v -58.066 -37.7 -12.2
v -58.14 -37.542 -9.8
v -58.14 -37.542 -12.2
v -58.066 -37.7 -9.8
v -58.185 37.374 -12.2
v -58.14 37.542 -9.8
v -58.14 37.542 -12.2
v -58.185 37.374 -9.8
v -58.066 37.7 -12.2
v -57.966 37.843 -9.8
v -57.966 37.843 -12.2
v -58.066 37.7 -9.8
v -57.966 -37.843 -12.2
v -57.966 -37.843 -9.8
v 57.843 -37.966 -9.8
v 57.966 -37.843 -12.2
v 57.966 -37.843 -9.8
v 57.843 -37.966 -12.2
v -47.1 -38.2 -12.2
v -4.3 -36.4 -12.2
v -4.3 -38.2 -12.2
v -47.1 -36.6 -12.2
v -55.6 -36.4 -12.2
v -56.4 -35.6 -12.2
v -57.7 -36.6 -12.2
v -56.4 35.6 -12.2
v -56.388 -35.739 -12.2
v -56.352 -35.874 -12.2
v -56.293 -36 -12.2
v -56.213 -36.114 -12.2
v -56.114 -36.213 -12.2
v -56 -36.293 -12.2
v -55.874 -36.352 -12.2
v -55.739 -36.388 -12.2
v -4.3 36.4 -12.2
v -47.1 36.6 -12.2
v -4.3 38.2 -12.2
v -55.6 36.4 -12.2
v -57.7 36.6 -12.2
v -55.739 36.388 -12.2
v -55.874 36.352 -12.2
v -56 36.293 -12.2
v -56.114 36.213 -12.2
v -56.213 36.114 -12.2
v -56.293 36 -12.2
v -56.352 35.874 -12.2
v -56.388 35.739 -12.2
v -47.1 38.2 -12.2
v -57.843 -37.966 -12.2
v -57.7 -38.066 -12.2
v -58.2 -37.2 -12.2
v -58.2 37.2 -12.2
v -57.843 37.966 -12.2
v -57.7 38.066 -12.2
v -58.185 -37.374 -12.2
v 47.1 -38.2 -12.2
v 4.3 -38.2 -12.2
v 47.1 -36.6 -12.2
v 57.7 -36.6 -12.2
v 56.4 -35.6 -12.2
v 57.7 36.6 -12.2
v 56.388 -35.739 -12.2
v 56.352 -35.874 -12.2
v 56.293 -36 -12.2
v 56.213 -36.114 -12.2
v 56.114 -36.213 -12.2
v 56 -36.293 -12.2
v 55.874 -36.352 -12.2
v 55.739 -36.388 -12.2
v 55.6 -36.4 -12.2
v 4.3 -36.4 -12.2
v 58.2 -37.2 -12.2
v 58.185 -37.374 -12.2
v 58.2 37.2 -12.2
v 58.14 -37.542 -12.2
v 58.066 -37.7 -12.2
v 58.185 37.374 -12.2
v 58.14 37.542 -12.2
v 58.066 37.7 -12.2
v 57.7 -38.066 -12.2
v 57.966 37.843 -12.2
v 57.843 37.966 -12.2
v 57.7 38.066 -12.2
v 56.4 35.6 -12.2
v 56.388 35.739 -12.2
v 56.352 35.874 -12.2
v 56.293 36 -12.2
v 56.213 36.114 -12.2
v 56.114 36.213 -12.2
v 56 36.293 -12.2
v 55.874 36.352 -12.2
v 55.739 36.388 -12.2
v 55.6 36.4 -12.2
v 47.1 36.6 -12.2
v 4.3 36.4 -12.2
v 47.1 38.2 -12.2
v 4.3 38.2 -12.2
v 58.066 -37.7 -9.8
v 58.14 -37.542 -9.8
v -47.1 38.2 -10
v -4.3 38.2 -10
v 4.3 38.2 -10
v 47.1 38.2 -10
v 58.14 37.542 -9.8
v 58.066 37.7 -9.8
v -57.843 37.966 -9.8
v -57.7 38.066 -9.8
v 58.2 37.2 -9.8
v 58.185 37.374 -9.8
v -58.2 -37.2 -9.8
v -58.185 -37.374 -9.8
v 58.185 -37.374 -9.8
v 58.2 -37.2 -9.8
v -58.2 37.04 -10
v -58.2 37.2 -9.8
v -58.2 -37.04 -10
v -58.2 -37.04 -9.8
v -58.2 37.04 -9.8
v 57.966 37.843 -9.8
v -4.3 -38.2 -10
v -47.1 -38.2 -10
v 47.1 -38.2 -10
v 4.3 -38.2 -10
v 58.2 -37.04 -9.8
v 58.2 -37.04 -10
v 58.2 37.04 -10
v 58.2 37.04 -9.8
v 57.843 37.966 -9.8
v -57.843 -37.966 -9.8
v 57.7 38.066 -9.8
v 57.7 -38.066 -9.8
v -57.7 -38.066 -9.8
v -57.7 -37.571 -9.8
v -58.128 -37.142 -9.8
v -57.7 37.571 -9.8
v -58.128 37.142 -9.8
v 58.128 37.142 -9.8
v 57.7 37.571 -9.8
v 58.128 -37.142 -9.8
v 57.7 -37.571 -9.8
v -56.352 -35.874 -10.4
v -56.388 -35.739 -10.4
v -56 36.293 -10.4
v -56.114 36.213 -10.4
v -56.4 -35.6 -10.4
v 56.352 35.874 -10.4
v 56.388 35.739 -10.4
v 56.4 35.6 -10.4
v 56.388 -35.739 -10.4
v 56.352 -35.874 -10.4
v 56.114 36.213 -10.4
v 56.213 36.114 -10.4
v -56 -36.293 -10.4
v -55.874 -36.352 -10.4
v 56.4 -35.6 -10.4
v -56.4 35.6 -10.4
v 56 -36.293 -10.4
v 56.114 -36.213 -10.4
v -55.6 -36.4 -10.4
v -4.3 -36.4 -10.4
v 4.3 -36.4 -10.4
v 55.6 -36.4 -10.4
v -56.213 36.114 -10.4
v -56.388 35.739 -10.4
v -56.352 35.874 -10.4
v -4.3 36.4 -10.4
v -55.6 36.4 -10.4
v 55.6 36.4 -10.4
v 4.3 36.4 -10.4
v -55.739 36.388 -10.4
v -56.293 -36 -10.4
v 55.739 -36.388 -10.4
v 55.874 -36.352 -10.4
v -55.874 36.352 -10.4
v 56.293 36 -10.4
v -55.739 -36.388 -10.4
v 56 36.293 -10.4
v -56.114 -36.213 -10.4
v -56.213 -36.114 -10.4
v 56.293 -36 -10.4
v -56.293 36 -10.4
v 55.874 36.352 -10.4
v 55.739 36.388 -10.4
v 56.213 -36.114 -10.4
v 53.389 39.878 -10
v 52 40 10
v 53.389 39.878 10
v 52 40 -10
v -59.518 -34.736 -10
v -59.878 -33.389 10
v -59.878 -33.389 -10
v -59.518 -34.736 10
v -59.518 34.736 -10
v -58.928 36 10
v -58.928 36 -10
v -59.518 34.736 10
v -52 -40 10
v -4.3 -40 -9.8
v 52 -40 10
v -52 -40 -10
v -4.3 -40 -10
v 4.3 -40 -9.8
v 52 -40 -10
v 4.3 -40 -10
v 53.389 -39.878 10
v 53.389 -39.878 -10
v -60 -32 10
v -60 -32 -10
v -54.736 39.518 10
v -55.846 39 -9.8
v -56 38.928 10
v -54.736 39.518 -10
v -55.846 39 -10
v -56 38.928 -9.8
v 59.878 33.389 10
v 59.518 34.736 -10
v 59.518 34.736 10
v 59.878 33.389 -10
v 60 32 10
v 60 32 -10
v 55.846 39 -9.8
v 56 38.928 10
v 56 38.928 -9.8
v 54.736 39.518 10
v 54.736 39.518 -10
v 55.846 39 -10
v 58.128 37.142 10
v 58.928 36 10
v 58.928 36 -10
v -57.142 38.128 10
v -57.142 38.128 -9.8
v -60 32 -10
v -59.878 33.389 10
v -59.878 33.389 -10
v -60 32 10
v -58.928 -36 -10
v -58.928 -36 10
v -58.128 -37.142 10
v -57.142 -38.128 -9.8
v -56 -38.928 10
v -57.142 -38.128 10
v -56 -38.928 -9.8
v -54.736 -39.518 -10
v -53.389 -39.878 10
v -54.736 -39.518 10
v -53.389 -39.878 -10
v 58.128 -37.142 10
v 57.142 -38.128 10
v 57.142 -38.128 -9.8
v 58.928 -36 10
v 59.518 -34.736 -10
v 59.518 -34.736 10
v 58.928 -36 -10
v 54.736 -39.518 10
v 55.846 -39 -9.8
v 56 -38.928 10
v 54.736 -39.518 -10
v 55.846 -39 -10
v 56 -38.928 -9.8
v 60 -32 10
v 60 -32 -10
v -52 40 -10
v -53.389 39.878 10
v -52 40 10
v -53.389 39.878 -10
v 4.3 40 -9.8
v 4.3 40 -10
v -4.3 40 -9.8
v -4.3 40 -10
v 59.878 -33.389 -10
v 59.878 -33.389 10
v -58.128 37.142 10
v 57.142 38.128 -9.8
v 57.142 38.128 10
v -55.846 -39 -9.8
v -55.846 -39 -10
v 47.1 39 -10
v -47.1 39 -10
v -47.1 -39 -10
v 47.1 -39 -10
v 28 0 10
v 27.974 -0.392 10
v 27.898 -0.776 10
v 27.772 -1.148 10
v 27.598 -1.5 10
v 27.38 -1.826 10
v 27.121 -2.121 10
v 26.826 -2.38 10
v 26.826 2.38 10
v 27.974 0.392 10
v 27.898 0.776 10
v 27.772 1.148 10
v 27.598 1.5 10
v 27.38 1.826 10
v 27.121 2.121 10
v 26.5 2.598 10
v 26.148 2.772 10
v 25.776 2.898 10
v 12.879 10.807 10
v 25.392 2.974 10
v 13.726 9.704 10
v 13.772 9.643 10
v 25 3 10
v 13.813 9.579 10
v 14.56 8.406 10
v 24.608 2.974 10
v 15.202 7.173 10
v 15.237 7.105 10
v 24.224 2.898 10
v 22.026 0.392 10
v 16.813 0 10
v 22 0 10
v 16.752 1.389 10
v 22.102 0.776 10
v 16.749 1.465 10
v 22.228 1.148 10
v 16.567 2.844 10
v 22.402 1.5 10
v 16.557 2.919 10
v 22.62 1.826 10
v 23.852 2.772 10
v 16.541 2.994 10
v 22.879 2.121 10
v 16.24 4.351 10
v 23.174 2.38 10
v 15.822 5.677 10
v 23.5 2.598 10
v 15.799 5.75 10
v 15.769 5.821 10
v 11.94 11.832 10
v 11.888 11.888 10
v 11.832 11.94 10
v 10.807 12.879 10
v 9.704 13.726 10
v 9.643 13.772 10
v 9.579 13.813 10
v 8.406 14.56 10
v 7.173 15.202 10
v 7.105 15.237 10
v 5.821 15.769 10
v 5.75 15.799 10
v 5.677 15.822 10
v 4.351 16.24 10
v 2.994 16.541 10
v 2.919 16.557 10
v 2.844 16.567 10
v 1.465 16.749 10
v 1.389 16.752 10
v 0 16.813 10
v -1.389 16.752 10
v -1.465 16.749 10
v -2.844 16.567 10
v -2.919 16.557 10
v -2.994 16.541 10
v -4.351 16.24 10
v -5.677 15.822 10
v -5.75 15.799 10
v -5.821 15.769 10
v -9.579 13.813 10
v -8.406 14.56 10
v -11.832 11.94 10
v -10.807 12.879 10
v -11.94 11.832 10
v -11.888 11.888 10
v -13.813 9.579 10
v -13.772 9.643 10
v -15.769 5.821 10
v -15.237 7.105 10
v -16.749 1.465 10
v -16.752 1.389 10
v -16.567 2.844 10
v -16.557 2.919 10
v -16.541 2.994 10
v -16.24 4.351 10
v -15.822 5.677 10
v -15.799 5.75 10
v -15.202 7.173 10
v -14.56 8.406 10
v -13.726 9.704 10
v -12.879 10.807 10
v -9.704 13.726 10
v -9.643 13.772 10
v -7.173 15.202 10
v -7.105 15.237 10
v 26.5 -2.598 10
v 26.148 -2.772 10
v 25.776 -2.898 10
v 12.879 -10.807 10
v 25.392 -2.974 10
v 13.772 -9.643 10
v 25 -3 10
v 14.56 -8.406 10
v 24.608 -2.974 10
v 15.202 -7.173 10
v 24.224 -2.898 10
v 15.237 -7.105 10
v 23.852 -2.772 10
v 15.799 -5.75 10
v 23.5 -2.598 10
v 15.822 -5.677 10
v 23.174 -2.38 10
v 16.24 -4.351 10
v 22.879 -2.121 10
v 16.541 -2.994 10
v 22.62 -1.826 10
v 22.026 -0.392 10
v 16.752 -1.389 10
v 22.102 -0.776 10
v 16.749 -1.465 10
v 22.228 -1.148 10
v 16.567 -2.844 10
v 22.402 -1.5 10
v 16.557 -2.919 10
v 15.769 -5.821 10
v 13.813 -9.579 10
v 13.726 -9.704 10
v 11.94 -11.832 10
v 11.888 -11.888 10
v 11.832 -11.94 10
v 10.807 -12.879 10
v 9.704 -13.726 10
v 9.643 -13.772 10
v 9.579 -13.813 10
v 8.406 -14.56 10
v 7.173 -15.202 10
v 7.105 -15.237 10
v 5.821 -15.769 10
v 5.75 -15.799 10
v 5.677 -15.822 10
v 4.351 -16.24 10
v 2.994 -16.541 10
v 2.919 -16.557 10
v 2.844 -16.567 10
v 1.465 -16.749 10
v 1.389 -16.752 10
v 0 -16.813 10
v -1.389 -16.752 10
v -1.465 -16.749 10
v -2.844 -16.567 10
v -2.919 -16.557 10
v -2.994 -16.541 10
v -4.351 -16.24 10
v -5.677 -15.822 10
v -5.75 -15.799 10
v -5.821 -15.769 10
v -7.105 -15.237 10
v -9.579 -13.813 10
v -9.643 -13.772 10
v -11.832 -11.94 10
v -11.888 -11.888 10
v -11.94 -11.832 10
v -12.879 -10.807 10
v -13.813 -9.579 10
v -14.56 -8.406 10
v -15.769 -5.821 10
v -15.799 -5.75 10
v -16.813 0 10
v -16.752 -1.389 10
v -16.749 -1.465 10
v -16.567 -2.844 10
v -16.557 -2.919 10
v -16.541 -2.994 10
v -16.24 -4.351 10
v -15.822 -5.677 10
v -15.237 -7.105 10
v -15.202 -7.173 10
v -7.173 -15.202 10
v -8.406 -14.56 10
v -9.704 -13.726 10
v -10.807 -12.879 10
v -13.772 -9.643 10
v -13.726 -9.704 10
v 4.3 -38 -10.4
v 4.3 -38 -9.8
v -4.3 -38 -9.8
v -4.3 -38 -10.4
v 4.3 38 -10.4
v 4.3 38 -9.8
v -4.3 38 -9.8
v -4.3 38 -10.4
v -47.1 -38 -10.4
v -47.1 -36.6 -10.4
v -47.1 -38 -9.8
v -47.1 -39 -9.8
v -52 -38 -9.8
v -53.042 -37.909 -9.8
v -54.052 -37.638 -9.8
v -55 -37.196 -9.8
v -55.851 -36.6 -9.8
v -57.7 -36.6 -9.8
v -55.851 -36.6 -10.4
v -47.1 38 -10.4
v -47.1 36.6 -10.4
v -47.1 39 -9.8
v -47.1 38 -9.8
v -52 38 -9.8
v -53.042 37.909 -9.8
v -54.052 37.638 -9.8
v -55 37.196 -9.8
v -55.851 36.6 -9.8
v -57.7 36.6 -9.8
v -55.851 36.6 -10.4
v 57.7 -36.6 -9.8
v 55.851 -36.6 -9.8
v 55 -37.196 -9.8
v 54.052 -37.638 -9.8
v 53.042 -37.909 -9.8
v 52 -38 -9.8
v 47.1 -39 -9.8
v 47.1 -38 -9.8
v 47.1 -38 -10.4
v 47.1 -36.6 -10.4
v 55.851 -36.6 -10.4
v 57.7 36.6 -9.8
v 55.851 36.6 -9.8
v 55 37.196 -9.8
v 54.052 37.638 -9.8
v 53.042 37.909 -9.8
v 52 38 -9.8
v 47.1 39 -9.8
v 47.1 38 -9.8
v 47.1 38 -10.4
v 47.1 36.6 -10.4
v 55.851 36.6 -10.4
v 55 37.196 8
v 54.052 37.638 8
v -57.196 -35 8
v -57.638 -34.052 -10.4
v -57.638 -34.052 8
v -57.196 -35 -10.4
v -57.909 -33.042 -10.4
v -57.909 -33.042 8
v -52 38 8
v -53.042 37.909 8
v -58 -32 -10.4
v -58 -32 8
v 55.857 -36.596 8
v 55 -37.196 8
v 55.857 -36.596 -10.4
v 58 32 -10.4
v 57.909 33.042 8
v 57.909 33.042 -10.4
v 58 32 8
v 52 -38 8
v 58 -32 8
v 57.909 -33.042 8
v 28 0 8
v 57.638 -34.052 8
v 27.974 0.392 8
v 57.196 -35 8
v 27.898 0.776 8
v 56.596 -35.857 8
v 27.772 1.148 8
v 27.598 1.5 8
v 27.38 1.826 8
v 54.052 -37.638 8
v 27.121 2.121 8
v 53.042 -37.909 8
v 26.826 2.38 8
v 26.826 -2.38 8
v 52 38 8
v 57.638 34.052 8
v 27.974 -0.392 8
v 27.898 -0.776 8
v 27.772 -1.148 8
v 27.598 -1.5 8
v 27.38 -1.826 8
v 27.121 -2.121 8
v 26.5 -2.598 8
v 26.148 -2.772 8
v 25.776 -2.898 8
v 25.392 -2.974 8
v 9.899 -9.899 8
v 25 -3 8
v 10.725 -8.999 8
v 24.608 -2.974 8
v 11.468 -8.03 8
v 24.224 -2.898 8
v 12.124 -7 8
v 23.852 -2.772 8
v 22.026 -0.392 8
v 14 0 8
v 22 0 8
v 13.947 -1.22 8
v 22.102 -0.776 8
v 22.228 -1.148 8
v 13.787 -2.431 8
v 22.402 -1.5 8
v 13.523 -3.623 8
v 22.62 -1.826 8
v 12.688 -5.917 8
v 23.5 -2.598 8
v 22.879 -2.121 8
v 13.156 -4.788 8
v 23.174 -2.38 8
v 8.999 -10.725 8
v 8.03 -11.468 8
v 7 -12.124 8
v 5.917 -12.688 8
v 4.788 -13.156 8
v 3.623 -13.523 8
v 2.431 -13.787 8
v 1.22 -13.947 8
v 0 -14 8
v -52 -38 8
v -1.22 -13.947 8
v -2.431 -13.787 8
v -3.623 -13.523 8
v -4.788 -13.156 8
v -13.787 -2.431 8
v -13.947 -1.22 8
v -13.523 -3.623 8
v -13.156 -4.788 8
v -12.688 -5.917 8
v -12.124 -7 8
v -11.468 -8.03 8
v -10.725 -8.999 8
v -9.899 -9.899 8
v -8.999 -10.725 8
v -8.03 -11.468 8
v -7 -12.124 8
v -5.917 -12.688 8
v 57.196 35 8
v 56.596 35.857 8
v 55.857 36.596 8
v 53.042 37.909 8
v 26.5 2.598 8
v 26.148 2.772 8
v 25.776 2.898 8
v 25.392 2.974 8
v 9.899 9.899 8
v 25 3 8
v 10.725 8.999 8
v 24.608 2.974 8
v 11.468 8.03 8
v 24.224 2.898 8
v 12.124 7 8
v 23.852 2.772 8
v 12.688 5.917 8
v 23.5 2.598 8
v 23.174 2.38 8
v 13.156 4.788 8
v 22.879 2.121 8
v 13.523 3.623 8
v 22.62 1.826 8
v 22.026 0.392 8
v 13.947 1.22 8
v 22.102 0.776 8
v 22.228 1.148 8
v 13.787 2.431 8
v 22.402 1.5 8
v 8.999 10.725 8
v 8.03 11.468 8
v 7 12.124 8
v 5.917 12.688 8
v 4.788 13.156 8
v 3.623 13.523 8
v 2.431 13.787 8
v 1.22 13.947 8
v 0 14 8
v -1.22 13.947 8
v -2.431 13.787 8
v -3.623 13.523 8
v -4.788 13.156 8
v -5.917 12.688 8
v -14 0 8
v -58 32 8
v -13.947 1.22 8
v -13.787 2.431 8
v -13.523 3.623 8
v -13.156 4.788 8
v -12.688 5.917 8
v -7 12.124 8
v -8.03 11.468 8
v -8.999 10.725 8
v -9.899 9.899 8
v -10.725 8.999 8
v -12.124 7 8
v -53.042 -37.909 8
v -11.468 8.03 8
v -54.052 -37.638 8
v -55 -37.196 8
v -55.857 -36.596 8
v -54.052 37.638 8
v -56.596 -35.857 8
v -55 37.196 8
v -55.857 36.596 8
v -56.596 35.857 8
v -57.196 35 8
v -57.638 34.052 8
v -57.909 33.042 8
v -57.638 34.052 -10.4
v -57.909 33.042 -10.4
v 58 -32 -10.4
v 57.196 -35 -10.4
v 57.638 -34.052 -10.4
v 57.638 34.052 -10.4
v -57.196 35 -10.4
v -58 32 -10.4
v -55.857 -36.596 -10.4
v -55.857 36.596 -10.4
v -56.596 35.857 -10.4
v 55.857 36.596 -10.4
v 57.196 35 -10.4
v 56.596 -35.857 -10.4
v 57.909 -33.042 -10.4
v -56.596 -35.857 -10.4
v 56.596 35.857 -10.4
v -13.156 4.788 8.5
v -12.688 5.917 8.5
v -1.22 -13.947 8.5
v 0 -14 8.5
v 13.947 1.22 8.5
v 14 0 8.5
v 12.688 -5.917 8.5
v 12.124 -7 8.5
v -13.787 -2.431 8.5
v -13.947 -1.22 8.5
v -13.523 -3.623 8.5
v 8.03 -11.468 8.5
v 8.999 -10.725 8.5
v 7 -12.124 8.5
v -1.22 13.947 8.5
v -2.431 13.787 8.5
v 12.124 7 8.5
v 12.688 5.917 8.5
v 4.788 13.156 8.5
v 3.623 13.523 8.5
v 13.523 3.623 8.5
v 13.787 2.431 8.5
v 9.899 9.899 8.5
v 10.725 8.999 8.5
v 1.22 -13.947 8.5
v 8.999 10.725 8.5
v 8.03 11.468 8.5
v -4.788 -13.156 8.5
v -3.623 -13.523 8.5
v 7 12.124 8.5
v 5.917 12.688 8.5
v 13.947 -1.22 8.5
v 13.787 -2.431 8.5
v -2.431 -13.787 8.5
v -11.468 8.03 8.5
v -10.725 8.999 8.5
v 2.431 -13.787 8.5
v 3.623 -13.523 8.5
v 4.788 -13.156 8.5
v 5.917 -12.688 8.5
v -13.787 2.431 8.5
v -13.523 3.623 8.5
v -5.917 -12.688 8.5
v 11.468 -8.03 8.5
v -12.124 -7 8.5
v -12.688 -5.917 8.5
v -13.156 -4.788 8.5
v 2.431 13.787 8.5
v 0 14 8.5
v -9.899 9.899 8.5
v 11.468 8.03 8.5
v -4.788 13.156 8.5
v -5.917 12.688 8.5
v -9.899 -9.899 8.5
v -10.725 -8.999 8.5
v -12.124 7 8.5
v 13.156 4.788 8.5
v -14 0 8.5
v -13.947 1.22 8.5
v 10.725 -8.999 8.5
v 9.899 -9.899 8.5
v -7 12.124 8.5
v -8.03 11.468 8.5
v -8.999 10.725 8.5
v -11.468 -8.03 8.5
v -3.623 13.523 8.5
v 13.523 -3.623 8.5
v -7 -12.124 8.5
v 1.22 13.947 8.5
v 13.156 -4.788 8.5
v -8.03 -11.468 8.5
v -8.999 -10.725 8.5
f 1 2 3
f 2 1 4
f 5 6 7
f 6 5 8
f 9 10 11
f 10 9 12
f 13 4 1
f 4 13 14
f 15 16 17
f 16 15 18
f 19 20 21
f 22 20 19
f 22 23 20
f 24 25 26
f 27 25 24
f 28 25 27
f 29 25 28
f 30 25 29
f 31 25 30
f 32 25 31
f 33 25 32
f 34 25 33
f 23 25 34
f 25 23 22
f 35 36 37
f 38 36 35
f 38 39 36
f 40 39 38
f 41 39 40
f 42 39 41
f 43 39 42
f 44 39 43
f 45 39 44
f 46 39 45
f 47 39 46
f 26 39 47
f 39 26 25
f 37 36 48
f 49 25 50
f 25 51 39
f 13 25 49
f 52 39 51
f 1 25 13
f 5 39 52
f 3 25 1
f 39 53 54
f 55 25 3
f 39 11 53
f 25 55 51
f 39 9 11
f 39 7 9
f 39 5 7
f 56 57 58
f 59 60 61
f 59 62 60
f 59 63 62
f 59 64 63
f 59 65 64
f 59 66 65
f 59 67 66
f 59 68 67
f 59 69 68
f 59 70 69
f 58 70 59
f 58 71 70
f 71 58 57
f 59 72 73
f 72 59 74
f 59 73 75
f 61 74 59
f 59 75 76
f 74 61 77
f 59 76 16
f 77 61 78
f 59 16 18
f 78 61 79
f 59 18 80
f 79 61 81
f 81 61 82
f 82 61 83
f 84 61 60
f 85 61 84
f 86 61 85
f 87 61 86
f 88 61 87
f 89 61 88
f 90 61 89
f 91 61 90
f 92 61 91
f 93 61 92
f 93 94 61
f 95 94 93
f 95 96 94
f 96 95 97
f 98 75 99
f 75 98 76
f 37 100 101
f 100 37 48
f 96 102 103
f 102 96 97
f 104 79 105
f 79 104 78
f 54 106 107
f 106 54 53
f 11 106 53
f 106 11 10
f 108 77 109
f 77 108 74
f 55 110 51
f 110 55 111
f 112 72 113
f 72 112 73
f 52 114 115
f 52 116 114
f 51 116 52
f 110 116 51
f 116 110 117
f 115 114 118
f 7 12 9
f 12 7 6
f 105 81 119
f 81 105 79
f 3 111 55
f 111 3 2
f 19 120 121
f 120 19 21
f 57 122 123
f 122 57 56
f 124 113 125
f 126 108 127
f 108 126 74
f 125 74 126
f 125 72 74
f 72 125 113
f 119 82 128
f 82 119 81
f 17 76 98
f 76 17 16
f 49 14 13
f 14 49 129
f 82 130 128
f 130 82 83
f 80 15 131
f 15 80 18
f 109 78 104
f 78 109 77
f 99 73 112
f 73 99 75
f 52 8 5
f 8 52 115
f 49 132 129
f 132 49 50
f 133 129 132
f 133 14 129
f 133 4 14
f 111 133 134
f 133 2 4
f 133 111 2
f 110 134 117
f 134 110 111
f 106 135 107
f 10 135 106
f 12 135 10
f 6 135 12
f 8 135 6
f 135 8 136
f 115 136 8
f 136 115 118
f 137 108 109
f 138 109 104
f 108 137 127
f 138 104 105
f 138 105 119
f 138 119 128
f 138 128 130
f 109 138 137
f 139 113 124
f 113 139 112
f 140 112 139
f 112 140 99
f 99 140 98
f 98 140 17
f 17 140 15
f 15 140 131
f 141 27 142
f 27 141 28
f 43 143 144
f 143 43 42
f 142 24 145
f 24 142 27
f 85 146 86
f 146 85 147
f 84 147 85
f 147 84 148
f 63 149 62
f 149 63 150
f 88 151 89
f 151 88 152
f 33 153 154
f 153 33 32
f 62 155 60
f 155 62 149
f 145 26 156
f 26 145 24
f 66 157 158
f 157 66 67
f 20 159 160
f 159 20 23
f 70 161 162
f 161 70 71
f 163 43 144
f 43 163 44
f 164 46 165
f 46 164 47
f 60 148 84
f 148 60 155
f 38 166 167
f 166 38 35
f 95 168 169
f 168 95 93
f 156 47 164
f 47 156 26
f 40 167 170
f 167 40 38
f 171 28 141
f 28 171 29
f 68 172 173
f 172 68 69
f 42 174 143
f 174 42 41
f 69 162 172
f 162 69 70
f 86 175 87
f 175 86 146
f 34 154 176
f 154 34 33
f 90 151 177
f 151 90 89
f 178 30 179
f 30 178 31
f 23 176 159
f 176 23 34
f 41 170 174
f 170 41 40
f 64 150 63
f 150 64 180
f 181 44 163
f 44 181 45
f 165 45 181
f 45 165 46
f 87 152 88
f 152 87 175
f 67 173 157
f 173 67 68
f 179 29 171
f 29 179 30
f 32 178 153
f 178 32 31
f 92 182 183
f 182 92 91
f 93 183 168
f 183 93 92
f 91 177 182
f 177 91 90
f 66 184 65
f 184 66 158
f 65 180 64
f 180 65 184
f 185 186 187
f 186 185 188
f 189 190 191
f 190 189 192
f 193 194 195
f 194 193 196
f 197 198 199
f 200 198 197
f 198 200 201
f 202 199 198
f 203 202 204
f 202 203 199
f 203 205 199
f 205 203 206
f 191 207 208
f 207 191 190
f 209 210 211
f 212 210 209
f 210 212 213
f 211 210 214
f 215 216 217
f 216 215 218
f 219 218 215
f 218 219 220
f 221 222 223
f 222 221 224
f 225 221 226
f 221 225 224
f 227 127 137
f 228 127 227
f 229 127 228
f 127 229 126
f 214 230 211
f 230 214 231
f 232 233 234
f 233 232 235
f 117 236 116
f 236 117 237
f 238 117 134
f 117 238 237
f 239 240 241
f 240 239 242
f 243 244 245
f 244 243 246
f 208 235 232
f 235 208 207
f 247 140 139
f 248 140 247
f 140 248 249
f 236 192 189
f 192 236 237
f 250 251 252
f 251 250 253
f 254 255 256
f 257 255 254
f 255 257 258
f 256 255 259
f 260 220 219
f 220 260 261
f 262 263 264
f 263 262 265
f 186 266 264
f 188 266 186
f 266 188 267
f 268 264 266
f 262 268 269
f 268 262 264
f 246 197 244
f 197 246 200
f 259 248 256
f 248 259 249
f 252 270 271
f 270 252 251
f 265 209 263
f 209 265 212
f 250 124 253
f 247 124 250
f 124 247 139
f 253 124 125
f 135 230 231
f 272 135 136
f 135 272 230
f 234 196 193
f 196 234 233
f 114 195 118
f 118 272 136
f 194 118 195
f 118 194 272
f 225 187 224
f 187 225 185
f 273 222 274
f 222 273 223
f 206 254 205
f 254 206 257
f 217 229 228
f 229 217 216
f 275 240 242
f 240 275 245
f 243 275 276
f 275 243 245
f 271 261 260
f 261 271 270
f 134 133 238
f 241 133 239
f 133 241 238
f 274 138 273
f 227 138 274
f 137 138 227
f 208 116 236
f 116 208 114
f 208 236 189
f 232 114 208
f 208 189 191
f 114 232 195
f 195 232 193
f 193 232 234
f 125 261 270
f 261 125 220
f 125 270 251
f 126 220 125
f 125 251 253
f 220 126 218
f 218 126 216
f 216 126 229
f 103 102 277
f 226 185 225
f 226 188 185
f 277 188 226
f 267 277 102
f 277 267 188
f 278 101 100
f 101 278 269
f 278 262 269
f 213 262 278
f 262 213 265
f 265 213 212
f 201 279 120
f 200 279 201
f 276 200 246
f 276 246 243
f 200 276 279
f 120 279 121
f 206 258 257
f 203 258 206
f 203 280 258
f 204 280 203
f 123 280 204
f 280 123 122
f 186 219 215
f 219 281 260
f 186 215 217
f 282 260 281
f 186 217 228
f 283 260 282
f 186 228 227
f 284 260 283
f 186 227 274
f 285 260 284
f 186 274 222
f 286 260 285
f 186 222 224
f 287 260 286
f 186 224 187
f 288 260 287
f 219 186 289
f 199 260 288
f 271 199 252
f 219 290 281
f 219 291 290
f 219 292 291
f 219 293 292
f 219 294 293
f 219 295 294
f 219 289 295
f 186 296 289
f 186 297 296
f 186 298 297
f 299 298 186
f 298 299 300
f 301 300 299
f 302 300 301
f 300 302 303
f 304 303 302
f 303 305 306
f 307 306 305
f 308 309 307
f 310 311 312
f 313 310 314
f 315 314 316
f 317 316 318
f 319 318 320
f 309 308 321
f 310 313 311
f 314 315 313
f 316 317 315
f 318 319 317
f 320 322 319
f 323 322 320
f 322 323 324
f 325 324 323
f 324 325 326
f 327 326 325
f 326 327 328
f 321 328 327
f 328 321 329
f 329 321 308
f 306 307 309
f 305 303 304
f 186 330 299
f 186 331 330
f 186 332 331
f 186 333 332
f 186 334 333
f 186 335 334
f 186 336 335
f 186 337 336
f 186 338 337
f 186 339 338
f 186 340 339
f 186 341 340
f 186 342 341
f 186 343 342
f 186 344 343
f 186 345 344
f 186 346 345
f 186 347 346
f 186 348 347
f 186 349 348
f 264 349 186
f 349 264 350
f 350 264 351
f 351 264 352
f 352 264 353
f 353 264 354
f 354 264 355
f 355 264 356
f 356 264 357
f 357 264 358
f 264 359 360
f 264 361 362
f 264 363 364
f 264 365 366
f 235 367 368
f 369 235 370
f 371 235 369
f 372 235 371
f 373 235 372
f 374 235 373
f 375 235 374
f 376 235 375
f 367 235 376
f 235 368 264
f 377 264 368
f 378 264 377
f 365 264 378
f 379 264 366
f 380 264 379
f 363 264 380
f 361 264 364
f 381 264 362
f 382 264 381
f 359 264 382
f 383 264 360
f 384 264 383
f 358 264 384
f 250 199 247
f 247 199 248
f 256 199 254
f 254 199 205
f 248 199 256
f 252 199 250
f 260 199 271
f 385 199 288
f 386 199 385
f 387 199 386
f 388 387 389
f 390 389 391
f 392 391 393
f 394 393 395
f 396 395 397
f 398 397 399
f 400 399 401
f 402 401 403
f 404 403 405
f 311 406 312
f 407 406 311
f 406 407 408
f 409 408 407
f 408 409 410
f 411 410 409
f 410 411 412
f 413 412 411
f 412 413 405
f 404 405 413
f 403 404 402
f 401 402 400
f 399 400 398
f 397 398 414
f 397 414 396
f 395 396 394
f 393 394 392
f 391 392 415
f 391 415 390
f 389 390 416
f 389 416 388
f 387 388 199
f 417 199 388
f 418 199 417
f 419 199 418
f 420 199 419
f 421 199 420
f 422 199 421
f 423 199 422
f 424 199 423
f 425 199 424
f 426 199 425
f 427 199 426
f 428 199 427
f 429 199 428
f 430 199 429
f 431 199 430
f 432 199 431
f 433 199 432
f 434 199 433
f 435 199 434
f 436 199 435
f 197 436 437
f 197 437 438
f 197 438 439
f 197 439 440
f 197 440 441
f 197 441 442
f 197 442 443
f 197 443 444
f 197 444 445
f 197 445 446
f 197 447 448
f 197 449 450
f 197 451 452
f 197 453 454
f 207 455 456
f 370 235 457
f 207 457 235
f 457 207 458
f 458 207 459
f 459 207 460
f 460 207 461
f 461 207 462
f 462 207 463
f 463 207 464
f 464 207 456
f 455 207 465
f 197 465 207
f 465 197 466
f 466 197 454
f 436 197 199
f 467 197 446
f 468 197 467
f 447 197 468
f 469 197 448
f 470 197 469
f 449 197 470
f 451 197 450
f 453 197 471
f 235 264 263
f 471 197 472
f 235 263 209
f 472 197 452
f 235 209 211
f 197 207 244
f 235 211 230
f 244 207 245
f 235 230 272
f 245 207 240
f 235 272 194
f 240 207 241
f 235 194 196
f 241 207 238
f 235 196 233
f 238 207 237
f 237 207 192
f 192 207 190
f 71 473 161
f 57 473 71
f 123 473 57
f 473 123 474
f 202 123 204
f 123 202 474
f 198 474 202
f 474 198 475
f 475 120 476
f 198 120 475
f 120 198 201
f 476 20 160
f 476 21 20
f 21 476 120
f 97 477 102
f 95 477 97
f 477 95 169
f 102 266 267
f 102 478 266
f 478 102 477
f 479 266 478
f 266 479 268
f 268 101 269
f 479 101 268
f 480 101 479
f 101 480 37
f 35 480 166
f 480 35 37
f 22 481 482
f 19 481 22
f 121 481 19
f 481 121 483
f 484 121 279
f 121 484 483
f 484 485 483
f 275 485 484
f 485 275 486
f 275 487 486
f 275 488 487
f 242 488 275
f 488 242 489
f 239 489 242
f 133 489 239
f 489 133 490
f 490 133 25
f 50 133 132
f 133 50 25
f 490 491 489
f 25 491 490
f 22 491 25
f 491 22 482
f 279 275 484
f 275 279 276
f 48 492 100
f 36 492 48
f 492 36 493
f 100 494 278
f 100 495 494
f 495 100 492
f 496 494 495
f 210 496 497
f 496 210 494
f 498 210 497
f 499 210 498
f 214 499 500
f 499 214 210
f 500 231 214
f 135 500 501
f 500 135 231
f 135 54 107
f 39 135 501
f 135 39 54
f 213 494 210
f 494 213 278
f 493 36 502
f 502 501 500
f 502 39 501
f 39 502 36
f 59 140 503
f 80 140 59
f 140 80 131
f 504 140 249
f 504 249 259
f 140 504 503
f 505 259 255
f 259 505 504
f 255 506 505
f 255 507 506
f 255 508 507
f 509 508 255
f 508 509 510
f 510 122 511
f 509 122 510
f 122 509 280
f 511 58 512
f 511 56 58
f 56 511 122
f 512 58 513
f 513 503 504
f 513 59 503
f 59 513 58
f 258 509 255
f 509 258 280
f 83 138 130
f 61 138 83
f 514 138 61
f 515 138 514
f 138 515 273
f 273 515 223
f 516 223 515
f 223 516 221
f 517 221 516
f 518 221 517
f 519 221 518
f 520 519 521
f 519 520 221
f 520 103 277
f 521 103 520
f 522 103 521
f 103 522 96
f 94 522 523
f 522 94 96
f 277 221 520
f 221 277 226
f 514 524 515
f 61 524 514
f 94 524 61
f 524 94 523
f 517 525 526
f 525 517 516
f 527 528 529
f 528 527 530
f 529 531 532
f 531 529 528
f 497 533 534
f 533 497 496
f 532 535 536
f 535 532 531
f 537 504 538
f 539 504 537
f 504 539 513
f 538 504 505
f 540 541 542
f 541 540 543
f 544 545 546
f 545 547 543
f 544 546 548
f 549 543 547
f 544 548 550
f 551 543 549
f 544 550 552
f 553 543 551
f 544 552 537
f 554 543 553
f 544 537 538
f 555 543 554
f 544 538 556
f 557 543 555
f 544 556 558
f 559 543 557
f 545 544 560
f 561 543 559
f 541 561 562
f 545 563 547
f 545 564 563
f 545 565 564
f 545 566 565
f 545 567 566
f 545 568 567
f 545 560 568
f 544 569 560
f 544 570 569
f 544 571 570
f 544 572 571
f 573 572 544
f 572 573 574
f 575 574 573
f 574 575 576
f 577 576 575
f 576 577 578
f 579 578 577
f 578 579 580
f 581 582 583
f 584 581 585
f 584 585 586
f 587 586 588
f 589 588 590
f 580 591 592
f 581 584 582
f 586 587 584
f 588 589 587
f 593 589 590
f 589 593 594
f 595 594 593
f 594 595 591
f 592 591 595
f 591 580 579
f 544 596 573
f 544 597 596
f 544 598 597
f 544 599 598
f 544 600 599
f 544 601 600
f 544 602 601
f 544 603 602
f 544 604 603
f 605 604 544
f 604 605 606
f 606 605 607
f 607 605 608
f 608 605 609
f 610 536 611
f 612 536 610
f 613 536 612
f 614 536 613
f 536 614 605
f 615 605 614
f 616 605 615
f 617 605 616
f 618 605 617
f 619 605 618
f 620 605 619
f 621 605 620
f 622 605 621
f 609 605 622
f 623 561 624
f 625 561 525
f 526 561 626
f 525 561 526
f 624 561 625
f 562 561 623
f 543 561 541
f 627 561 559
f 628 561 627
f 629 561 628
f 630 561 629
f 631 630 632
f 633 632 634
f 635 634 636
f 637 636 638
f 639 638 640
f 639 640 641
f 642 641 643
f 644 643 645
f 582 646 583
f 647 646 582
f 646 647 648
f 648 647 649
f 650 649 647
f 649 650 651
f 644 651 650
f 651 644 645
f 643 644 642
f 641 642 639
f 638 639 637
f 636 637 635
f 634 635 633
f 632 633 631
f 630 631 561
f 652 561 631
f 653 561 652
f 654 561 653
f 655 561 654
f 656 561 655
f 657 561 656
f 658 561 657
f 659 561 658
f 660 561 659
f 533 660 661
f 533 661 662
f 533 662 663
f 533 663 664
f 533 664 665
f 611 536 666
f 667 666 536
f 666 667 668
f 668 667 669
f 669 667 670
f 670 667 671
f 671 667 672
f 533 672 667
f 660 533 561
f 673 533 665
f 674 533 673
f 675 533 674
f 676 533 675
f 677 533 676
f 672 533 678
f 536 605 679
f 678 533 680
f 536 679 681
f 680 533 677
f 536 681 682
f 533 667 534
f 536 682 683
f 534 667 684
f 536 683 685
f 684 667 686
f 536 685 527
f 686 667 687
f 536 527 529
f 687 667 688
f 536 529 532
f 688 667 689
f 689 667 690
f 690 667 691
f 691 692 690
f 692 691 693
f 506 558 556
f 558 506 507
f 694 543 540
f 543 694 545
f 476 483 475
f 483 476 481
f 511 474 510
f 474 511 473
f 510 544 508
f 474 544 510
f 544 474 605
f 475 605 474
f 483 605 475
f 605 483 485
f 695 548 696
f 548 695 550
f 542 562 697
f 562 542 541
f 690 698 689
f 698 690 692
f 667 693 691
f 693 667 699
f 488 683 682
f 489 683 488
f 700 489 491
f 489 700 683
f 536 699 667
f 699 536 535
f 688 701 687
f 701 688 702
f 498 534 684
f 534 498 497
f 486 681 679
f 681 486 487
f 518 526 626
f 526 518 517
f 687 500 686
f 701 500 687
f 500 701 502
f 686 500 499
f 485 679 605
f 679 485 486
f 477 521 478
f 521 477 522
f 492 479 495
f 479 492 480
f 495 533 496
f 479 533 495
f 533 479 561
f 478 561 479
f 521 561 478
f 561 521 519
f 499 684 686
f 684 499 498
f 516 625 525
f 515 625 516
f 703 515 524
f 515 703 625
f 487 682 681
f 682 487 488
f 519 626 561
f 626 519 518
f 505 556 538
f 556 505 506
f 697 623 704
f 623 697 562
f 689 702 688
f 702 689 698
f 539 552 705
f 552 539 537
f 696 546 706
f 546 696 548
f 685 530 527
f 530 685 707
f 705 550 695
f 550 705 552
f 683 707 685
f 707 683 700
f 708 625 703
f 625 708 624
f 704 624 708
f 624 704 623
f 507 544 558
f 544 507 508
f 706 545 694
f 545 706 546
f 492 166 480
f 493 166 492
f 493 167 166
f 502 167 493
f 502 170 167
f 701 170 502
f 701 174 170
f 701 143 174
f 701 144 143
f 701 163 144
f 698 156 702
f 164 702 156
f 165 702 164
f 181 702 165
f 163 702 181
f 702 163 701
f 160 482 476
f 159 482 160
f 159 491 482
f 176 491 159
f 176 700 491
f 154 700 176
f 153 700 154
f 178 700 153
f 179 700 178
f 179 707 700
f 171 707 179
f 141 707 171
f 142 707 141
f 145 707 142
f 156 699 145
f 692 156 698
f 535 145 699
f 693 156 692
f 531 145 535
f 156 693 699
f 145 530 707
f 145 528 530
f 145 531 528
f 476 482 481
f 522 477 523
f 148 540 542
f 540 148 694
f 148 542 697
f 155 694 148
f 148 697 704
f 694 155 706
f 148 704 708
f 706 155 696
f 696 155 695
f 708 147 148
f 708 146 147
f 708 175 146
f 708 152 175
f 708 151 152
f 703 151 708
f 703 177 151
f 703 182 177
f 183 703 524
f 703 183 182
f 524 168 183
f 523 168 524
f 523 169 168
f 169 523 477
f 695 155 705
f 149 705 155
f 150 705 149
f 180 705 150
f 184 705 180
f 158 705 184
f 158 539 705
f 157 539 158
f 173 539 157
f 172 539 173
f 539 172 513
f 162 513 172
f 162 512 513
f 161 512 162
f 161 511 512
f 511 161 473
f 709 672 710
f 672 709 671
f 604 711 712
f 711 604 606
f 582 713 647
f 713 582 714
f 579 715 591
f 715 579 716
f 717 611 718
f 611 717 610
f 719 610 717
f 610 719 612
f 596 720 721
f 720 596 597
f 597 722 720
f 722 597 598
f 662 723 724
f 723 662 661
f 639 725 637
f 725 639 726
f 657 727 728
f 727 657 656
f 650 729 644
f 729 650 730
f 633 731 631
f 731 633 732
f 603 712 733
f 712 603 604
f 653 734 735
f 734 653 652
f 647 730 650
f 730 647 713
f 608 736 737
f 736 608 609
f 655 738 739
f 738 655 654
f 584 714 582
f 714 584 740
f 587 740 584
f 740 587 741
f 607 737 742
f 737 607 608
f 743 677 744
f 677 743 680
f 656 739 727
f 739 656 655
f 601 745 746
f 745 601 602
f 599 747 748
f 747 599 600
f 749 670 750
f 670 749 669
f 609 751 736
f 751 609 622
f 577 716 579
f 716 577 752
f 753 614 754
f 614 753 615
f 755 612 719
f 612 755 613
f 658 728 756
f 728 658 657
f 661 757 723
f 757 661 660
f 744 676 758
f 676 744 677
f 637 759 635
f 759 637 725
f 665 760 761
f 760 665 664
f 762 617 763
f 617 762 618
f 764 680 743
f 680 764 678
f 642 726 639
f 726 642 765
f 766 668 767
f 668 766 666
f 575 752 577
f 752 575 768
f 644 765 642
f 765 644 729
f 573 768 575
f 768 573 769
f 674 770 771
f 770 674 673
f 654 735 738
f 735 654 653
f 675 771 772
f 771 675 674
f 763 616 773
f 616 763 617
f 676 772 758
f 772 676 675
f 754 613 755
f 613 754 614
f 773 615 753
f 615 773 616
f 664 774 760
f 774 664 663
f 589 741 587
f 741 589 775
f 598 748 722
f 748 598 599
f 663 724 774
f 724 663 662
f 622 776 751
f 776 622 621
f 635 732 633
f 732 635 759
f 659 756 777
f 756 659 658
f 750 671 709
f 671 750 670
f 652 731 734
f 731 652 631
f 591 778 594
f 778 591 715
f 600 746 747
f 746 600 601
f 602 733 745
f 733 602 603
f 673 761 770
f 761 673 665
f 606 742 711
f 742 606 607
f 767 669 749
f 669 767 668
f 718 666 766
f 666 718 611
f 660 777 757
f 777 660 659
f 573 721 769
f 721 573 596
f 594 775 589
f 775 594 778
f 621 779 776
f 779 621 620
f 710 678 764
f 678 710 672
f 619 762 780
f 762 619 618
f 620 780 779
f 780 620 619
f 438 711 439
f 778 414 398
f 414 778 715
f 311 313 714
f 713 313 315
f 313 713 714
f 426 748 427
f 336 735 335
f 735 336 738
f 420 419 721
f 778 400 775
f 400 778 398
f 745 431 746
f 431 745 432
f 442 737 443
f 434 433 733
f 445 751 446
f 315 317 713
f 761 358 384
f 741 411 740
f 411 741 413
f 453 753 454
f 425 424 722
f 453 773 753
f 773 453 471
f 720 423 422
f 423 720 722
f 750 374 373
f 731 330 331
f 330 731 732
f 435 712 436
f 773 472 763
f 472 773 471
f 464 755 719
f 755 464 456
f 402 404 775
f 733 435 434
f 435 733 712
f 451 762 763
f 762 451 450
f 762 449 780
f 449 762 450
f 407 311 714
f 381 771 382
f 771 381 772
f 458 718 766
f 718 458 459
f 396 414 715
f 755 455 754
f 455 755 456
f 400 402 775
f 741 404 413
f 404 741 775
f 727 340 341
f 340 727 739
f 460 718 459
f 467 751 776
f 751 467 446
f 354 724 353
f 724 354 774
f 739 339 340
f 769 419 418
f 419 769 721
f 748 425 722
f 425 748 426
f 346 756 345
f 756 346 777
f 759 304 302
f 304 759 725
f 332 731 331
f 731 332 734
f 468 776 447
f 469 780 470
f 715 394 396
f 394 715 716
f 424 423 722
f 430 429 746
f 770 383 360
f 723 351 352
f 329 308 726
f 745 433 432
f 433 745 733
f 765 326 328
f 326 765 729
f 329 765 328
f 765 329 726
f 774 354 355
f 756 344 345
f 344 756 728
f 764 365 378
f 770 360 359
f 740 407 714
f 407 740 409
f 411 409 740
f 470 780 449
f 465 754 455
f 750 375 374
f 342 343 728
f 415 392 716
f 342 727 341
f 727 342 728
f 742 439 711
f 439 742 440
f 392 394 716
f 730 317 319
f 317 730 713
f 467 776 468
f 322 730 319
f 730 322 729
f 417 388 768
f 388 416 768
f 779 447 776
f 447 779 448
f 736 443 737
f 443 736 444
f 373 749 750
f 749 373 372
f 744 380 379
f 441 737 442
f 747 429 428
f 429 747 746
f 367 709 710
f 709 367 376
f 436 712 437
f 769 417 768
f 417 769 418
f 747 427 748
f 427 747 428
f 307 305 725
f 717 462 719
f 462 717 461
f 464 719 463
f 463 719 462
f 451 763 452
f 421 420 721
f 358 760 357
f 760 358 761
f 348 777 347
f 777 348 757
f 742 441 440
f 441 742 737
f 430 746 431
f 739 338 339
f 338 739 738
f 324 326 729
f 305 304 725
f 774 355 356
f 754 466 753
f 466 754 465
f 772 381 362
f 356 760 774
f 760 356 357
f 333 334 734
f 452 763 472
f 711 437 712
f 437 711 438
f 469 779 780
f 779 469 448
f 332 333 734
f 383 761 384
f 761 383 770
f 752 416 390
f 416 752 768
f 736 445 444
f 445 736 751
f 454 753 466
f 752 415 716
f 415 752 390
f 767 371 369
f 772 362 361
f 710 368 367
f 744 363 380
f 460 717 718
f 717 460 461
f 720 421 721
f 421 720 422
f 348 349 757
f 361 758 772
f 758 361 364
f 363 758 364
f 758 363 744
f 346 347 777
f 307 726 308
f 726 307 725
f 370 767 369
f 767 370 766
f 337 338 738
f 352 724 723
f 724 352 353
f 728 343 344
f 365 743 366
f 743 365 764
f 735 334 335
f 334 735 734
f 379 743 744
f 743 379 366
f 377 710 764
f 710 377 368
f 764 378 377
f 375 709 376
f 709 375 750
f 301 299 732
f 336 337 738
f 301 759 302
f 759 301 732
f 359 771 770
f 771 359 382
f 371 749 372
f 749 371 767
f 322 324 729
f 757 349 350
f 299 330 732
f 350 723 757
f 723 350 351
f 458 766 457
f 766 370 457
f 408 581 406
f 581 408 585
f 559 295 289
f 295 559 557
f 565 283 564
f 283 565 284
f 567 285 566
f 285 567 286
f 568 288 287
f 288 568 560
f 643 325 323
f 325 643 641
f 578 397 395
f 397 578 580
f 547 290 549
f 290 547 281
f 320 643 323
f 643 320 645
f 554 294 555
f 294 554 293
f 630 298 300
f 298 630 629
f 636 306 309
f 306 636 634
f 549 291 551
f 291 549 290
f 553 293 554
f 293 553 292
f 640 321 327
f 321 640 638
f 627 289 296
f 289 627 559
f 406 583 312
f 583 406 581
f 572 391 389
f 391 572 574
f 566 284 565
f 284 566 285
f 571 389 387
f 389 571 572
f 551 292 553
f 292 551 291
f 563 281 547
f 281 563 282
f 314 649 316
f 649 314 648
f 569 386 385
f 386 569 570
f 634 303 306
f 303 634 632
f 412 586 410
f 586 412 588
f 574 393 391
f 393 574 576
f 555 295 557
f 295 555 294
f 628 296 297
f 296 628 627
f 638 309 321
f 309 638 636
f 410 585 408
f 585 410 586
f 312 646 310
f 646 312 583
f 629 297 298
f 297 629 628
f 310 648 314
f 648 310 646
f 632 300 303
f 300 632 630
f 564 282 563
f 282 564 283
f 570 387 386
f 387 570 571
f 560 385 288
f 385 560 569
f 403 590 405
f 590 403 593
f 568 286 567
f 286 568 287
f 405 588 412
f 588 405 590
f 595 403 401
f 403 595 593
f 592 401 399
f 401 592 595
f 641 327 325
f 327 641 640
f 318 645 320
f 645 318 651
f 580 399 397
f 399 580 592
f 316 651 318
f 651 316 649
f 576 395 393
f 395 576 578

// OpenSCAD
//
// SmartBlaster Rev A — Parametric OpenSCAD Model
// Enclosure with snap-fit, alignment, vents, and hardware mounting features.
//

//////////////////////////////
// EXPORT SELECTOR
//////////////////////////////

// Options: "assembly", "front_shell", "back_shell", "camera_bracket", "ir_mount", "mating_preview"
export_part = "front_shell";

// Fast-fit preview controls (used by "mating_preview")
preview_gap = 0.8;
preview_section_cut = true;
preview_section_offset_x = 10;
preview_show_voids = true;
preview_show_back_attached = true;


//////////////////////////////
// CORE PARAMETERS
//////////////////////////////

// Overall enclosure footprint
enclosure_width = 120;
enclosure_height = 80;
corner_radius = 8;
preview_back_attached_offset_x = enclosure_width * 0.68;

// Wall/interface
wall = 2;
fit_clearance = 0.3;
feature_attach_eps = 0.2;

// Depth stack (ADR 0003)
target_internal_depth = 61;
front_shell_depth = 20;
back_shell_depth = target_internal_depth - (front_shell_depth - wall) + wall;

// Front face shaping
front_curve_height = 2.2;


//////////////////////////////
// FEATURE PARAMETERS
//////////////////////////////

// Camera
cam_diameter = 27;
cam_clearance = 1;
cam_hole = cam_diameter + cam_clearance;
cam_offset_x = 0;
cam_offset_y = 0;
cam_chamfer_d = cam_hole + 6;
cam_chamfer_depth = 1.5;

// IR
ir_diameter = 6;
ir_offset_x = 25;
ir_offset_y = 0;

// Lip/groove interface
lip_margin = 5;
lip_thickness = 1.8;
lip_depth = 2.4;
groove_depth = lip_depth + 0.4;

// Alignment tabs
align_tab_w = 8;
align_tab_h = 4;
align_tab_depth = 3;
align_tab_edge_inset = 1.2;
mating_feature_y = enclosure_height / 2 - wall / 2;

// Snap-fit tabs and slots
snap_tab_w = 10;
snap_tab_t = 1.8;
snap_tab_l = 7;
snap_bump = 0.7;
snap_y_offset = mating_feature_y - align_tab_edge_inset;

// Screw posts
screw_post_d = 8;
screw_post_h = 10;
screw_hole_d = 2.6;
screw_head_relief_d = 5.6;
screw_head_relief_h = 2;
screw_offset_x = enclosure_width / 2 - 14;
screw_offset_y = enclosure_height / 2 - 14;

// Rear mounting boss (1/4-20 clearance)
mount_boss_diameter = 18;
mount_hole_diameter = 6.8;
mount_boss_height = 6;

// Pi standoffs (Zero 2 W)
standoff_height = 6;
standoff_radius = 3;
pi_mount_spacing_x = 58;
pi_mount_spacing_y = 23;

// Honeycomb vents
vent_hex_r = 2.8;
vent_pitch_x = vent_hex_r * 3.0;
vent_pitch_y = vent_hex_r * 2.6;
vent_rows = 5;
vent_cols = 9;
vent_region_w = 58;
vent_region_h = 34;


//////////////////////////////
// DERIVED INTERFACE GEOMETRY
//////////////////////////////

interface_w = enclosure_width - 2 * wall;
interface_h = enclosure_height - 2 * wall;

lip_outer_w = interface_w + 2 * feature_attach_eps;
lip_outer_h = interface_h + 2 * feature_attach_eps;
lip_inner_w = lip_outer_w - 2 * lip_thickness;
lip_inner_h = lip_outer_h - 2 * lip_thickness;
align_tab_y_offset = mating_feature_y - align_tab_edge_inset;

groove_outer_w = lip_outer_w + 2 * fit_clearance;
groove_outer_h = lip_outer_h + 2 * fit_clearance;
groove_inner_w = lip_inner_w - 2 * fit_clearance;
groove_inner_h = lip_inner_h - 2 * fit_clearance;


//////////////////////////////
// HELPER GEOMETRY
//////////////////////////////

module rounded_rect_2d(w, h, r) {
    rr = min(r, min(w, h) / 2 - 0.01);
    hull() {
        translate([ w / 2 - rr,  h / 2 - rr]) circle(r = rr, $fn = 36);
        translate([-w / 2 + rr,  h / 2 - rr]) circle(r = rr, $fn = 36);
        translate([ w / 2 - rr, -h / 2 + rr]) circle(r = rr, $fn = 36);
        translate([-w / 2 + rr, -h / 2 + rr]) circle(r = rr, $fn = 36);
    }
}

module rounded_prism(w, h, d, r, center = true) {
    if (center)
        translate([0, 0, -d / 2])
            linear_extrude(height = d)
                rounded_rect_2d(w, h, r);
    else
        linear_extrude(height = d)
            rounded_rect_2d(w, h, r);
}

module ring_prism(outer_w, outer_h, inner_w, inner_h, d, r_outer, r_inner, center = true) {
    difference() {
        rounded_prism(outer_w, outer_h, d, r_outer, center = center);
        rounded_prism(inner_w, inner_h, d + 0.2, r_inner, center = center);
    }
}

module screw_positions() {
    for (sx = [-1, 1])
        for (sy = [-1, 1])
            translate([sx * screw_offset_x, sy * screw_offset_y, 0])
                children();
}

module pi_standoff_positions() {
    for (sx = [-1, 1])
        for (sy = [-1, 1])
            translate([sx * pi_mount_spacing_x / 2, sy * pi_mount_spacing_y / 2, 0])
                children();
}

module alignment_tab_positions() {
    for (sy = [-1, 1])
        translate([0, sy * align_tab_y_offset, 0])
            children();
}

module snap_positions() {
    for (sx = [-1, 1])
        for (sy = [-1, 1])
            translate([sx * (enclosure_width / 2 - wall - snap_tab_w / 2 - 0.6), sy * snap_y_offset, 0])
                children();
}

module curved_front_skin() {
    intersection() {
        translate([0, 0, front_shell_depth / 2 - front_curve_height])
            scale([enclosure_width / 2, enclosure_height / 2, front_curve_height])
                sphere(r = 1, $fn = 96);
        translate([0, 0, front_shell_depth / 2 - front_curve_height / 2])
            cube([enclosure_width, enclosure_height, front_curve_height], center = true);
    }
}

module vent_hex_hole(h) {
    cylinder(h = h, r = vent_hex_r, $fn = 6, center = true);
}

module preview_clip() {
    if (preview_section_cut)
        intersection() {
            children();
            translate([preview_section_offset_x, 0, 0])
                cube([enclosure_width + 20, enclosure_height + 20, 120], center = true);
        }
    else
        children();
}

module front_mating_features() {
    // Mating plane at z = 0, with front features extending mostly in -z.
    color("lightgray")
        translate([0, 0, -lip_depth / 2])
            ring_prism(
                lip_outer_w,
                lip_outer_h,
                lip_inner_w,
                lip_inner_h,
                lip_depth,
                max(corner_radius - wall - lip_margin, 1),
                max(corner_radius - wall - lip_margin - lip_thickness, 0.8),
                center = true
            );

    if (preview_show_voids) {
        color([0.9, 0.3, 0.3, 0.55])
            alignment_tab_positions()
                translate([0, 0, -align_tab_depth / 2 + 0.1])
                    cube([
                        align_tab_w + 2 * fit_clearance,
                        align_tab_h + 2 * fit_clearance,
                        align_tab_depth + 0.2
                    ], center = true);

        color([0.9, 0.3, 0.3, 0.55])
            snap_positions()
                translate([0, 0, -snap_tab_l / 2 + 0.1])
                    cube([
                        snap_tab_w + 2 * fit_clearance,
                        snap_tab_t + 2 * fit_clearance,
                        snap_tab_l + 0.2
                    ], center = true);
    }
}

module back_mating_features() {
    // Mating plane at z = 0, with back features extending in +z and groove in -z.
    color("gainsboro")
        translate([0, 0, -groove_depth / 2])
            ring_prism(
                groove_outer_w,
                groove_outer_h,
                groove_inner_w,
                groove_inner_h,
                groove_depth,
                max(corner_radius - wall - lip_margin + fit_clearance, 1),
                max(corner_radius - wall - lip_margin - lip_thickness - fit_clearance, 0.8),
                center = true
            );

    color([0.2, 0.4, 0.9, 0.9])
        alignment_tab_positions()
            translate([0, 0, align_tab_depth / 2])
                cube([align_tab_w, align_tab_h, align_tab_depth], center = true);

    color([0.2, 0.4, 0.9, 0.9])
        snap_positions()
            union() {
                translate([0, 0, snap_tab_l / 2])
                    cube([snap_tab_w, snap_tab_t, snap_tab_l], center = true);
                translate([0, 0, snap_tab_l - 0.55])
                    cube([snap_tab_w, snap_tab_t + snap_bump, 1.1], center = true);
            }
}

module back_attached_features_preview() {
    // Isolated view of features that must remain attached to the back wall.
    color([0.7, 0.7, 0.7, 0.35])
        rounded_prism(
            enclosure_width - 2 * wall,
            enclosure_height - 2 * wall,
            wall,
            max(corner_radius - wall, 1),
            center = true
        );

    color([0.2, 0.7, 0.3, 0.9])
        pi_standoff_positions()
            translate([0, 0, wall / 2 - feature_attach_eps])
                cylinder(h = standoff_height + feature_attach_eps, r = standoff_radius, center = false, $fn = 40);

    color([0.95, 0.55, 0.15, 0.9])
        screw_positions()
            translate([0, 0, wall / 2 - feature_attach_eps])
                cylinder(h = screw_post_h + feature_attach_eps, d = screw_post_d, center = false, $fn = 48);

    color([0.25, 0.45, 0.9, 0.9])
        translate([0, 0, -wall / 2 - mount_boss_height])
            cylinder(d = mount_boss_diameter, h = mount_boss_height, center = false, $fn = 72);
}

module mating_preview() {
    union() {
        preview_clip() {
            translate([0, 0, preview_gap / 2])
                front_mating_features();
            translate([0, 0, -preview_gap / 2])
                back_mating_features();
        }

        if (preview_show_back_attached)
            translate([preview_back_attached_offset_x, 0, 0])
                back_attached_features_preview();
    }
}


//////////////////////////////
// FRONT SHELL
//////////////////////////////

module front_shell() {
    difference() {
        union() {
            rounded_prism(enclosure_width, enclosure_height, front_shell_depth, corner_radius, center = true);
            curved_front_skin();

            // Male lip for front/back interface
            translate([0, 0, -front_shell_depth / 2 - lip_depth / 2 + feature_attach_eps])
                ring_prism(
                    lip_outer_w,
                    lip_outer_h,
                    lip_inner_w,
                    lip_inner_h,
                    lip_depth,
                    max(corner_radius - wall - lip_margin, 1),
                    max(corner_radius - wall - lip_margin - lip_thickness, 0.8),
                    center = true
                );
        }

        // Hollow interior: keep the front face closed and the rear side open for internal routing
        translate([0, 0, -wall / 2 - feature_attach_eps])
            rounded_prism(
                enclosure_width - 2 * wall,
                enclosure_height - 2 * wall,
                front_shell_depth - wall + 2 * feature_attach_eps,
                max(corner_radius - wall, 1),
                center = true
            );

        // Ensure rear pass-through remains open for camera/IR routing
        translate([0, 0, -front_shell_depth / 2 - lip_depth / 2 + feature_attach_eps])
            rounded_prism(
                lip_inner_w - 2 * fit_clearance,
                lip_inner_h - 2 * fit_clearance,
                lip_depth + wall + 0.6,
                max(corner_radius - wall - lip_margin - lip_thickness - fit_clearance, 0.8),
                center = true
            );

        // Camera and chamfered front opening
        translate([cam_offset_x, cam_offset_y, front_shell_depth / 2 - wall - 0.1])
            cylinder(d = cam_hole, h = wall + 0.3, center = false, $fn = 72);
        translate([cam_offset_x, cam_offset_y, front_shell_depth / 2 - cam_chamfer_depth])
            cylinder(d1 = cam_hole, d2 = cam_chamfer_d, h = cam_chamfer_depth + 0.1, center = false, $fn = 72);

        // IR opening
        translate([ir_offset_x, ir_offset_y, front_shell_depth / 2 - wall - 0.1])
            cylinder(d = ir_diameter, h = wall + 0.3, center = false, $fn = 48);

        // Alignment pockets
        alignment_tab_positions()
            translate([0, 0, -front_shell_depth / 2 - align_tab_depth / 2 + 0.1])
                cube([
                    align_tab_w + 2 * fit_clearance,
                    align_tab_h + 2 * fit_clearance,
                    align_tab_depth + 0.2
                ], center = true);

        // Snap slots to receive back tabs
        snap_positions()
            translate([0, 0, -front_shell_depth / 2 - snap_tab_l / 2 + 0.1])
                cube([
                    snap_tab_w + 2 * fit_clearance,
                    snap_tab_t + 2 * fit_clearance,
                    snap_tab_l + 0.2
                ], center = true);

        // Through-holes for screws
        screw_positions()
            translate([0, 0, -front_shell_depth / 2 - 0.1])
                cylinder(d = screw_hole_d + 0.2, h = wall + lip_depth + 0.4, center = false, $fn = 36);
    }
}


//////////////////////////////
// BACK SHELL
//////////////////////////////

module back_shell() {
    module back_shell_body() {
        difference() {
            union() {
                rounded_prism(enclosure_width, enclosure_height, back_shell_depth, corner_radius, center = true);

                // Central rear mounting boss
                translate([0, 0, -back_shell_depth / 2 - mount_boss_height])
                    cylinder(d = mount_boss_diameter, h = mount_boss_height, center = false, $fn = 72);
            }

            // Hollow interior
            translate([0, 0, wall])
                rounded_prism(
                    enclosure_width - 2 * wall,
                    enclosure_height - 2 * wall,
                    back_shell_depth,
                    max(corner_radius - wall, 1),
                    center = true
                );

            // Female groove matching the front lip
            translate([0, 0, back_shell_depth / 2 - groove_depth / 2])
                ring_prism(
                    groove_outer_w,
                    groove_outer_h,
                    groove_inner_w,
                    groove_inner_h,
                    groove_depth,
                    max(corner_radius - wall - lip_margin + fit_clearance, 1),
                    max(corner_radius - wall - lip_margin - lip_thickness - fit_clearance, 0.8),
                    center = true
                );

            // Through-hole for rear mounting boss
            translate([0, 0, -back_shell_depth / 2 - mount_boss_height - 0.1])
                cylinder(d = mount_hole_diameter, h = mount_boss_height + wall + 0.2, center = false, $fn = 64);

            // Honeycomb vent field through back wall
            for (row = [0 : vent_rows - 1])
                for (col = [0 : vent_cols - 1]) {
                    x = (col - (vent_cols - 1) / 2) * vent_pitch_x + (row % 2) * vent_pitch_x / 2;
                    y = (row - (vent_rows - 1) / 2) * vent_pitch_y;
                    if (abs(x) < vent_region_w / 2 && abs(y) < vent_region_h / 2)
                        translate([x, y, -back_shell_depth / 2 + wall / 2])
                            vent_hex_hole(wall + 0.6);
                }
        }
    }

    difference() {
        union() {
            back_shell_body();

            // Pi standoffs
            pi_standoff_positions()
                translate([0, 0, -back_shell_depth / 2 + wall - feature_attach_eps])
                    cylinder(h = standoff_height + feature_attach_eps, r = standoff_radius, center = false, $fn = 40);

            // Screw posts
            screw_positions()
                translate([0, 0, -back_shell_depth / 2 + wall - feature_attach_eps])
                    cylinder(h = screw_post_h + feature_attach_eps, d = screw_post_d, center = false, $fn = 48);

            // Alignment tabs
            alignment_tab_positions()
                translate([0, 0, back_shell_depth / 2 + align_tab_depth / 2 - feature_attach_eps])
                    cube([align_tab_w, align_tab_h, align_tab_depth], center = true);

            // Snap tabs with small latch bump
            snap_positions()
                union() {
                    translate([0, 0, back_shell_depth / 2 + snap_tab_l / 2 - feature_attach_eps])
                        cube([snap_tab_w, snap_tab_t, snap_tab_l], center = true);
                    translate([0, 0, back_shell_depth / 2 + snap_tab_l - 0.55 - feature_attach_eps])
                        cube([snap_tab_w, snap_tab_t + snap_bump, 1.1], center = true);
                }
        }

        // Screw pilot holes and head relief
        screw_positions()
            translate([0, 0, -back_shell_depth / 2 + wall - feature_attach_eps - 0.1])
                cylinder(d = screw_hole_d, h = screw_post_h + feature_attach_eps + 0.4, center = false, $fn = 36);
        screw_positions()
            translate([0, 0, back_shell_depth / 2 - screw_head_relief_h])
                cylinder(d = screw_head_relief_d, h = screw_head_relief_h + 0.1, center = false, $fn = 48);
    }
}


//////////////////////////////
// ACCESSORY PARTS
//////////////////////////////

module camera_bracket() {
    difference() {
        rounded_prism(40, 40, 3, 3, center = true);
        translate([0, 0, 0.2])
            cylinder(d = cam_hole, h = 4, center = true, $fn = 72);
    }
}

module ir_mount() {
    difference() {
        rounded_prism(25, 20, 3, 2, center = true);
        translate([0, 0, 0.2])
            cylinder(d = ir_diameter, h = 4, center = true, $fn = 48);
    }
}

module assembly_view() {
    color("lightgray")
        front_shell();
    translate([0, 0, -(front_shell_depth / 2 + back_shell_depth / 2 + 6)])
        color("gainsboro")
            back_shell();
}


//////////////////////////////
// EXPORT SWITCH
//////////////////////////////

if (export_part == "front_shell")
    front_shell();
else if (export_part == "back_shell")
    back_shell();
else if (export_part == "camera_bracket")
    camera_bracket();
else if (export_part == "ir_mount")
    ir_mount();
else if (export_part == "mating_preview")
    mating_preview();
else
    assembly_view();
